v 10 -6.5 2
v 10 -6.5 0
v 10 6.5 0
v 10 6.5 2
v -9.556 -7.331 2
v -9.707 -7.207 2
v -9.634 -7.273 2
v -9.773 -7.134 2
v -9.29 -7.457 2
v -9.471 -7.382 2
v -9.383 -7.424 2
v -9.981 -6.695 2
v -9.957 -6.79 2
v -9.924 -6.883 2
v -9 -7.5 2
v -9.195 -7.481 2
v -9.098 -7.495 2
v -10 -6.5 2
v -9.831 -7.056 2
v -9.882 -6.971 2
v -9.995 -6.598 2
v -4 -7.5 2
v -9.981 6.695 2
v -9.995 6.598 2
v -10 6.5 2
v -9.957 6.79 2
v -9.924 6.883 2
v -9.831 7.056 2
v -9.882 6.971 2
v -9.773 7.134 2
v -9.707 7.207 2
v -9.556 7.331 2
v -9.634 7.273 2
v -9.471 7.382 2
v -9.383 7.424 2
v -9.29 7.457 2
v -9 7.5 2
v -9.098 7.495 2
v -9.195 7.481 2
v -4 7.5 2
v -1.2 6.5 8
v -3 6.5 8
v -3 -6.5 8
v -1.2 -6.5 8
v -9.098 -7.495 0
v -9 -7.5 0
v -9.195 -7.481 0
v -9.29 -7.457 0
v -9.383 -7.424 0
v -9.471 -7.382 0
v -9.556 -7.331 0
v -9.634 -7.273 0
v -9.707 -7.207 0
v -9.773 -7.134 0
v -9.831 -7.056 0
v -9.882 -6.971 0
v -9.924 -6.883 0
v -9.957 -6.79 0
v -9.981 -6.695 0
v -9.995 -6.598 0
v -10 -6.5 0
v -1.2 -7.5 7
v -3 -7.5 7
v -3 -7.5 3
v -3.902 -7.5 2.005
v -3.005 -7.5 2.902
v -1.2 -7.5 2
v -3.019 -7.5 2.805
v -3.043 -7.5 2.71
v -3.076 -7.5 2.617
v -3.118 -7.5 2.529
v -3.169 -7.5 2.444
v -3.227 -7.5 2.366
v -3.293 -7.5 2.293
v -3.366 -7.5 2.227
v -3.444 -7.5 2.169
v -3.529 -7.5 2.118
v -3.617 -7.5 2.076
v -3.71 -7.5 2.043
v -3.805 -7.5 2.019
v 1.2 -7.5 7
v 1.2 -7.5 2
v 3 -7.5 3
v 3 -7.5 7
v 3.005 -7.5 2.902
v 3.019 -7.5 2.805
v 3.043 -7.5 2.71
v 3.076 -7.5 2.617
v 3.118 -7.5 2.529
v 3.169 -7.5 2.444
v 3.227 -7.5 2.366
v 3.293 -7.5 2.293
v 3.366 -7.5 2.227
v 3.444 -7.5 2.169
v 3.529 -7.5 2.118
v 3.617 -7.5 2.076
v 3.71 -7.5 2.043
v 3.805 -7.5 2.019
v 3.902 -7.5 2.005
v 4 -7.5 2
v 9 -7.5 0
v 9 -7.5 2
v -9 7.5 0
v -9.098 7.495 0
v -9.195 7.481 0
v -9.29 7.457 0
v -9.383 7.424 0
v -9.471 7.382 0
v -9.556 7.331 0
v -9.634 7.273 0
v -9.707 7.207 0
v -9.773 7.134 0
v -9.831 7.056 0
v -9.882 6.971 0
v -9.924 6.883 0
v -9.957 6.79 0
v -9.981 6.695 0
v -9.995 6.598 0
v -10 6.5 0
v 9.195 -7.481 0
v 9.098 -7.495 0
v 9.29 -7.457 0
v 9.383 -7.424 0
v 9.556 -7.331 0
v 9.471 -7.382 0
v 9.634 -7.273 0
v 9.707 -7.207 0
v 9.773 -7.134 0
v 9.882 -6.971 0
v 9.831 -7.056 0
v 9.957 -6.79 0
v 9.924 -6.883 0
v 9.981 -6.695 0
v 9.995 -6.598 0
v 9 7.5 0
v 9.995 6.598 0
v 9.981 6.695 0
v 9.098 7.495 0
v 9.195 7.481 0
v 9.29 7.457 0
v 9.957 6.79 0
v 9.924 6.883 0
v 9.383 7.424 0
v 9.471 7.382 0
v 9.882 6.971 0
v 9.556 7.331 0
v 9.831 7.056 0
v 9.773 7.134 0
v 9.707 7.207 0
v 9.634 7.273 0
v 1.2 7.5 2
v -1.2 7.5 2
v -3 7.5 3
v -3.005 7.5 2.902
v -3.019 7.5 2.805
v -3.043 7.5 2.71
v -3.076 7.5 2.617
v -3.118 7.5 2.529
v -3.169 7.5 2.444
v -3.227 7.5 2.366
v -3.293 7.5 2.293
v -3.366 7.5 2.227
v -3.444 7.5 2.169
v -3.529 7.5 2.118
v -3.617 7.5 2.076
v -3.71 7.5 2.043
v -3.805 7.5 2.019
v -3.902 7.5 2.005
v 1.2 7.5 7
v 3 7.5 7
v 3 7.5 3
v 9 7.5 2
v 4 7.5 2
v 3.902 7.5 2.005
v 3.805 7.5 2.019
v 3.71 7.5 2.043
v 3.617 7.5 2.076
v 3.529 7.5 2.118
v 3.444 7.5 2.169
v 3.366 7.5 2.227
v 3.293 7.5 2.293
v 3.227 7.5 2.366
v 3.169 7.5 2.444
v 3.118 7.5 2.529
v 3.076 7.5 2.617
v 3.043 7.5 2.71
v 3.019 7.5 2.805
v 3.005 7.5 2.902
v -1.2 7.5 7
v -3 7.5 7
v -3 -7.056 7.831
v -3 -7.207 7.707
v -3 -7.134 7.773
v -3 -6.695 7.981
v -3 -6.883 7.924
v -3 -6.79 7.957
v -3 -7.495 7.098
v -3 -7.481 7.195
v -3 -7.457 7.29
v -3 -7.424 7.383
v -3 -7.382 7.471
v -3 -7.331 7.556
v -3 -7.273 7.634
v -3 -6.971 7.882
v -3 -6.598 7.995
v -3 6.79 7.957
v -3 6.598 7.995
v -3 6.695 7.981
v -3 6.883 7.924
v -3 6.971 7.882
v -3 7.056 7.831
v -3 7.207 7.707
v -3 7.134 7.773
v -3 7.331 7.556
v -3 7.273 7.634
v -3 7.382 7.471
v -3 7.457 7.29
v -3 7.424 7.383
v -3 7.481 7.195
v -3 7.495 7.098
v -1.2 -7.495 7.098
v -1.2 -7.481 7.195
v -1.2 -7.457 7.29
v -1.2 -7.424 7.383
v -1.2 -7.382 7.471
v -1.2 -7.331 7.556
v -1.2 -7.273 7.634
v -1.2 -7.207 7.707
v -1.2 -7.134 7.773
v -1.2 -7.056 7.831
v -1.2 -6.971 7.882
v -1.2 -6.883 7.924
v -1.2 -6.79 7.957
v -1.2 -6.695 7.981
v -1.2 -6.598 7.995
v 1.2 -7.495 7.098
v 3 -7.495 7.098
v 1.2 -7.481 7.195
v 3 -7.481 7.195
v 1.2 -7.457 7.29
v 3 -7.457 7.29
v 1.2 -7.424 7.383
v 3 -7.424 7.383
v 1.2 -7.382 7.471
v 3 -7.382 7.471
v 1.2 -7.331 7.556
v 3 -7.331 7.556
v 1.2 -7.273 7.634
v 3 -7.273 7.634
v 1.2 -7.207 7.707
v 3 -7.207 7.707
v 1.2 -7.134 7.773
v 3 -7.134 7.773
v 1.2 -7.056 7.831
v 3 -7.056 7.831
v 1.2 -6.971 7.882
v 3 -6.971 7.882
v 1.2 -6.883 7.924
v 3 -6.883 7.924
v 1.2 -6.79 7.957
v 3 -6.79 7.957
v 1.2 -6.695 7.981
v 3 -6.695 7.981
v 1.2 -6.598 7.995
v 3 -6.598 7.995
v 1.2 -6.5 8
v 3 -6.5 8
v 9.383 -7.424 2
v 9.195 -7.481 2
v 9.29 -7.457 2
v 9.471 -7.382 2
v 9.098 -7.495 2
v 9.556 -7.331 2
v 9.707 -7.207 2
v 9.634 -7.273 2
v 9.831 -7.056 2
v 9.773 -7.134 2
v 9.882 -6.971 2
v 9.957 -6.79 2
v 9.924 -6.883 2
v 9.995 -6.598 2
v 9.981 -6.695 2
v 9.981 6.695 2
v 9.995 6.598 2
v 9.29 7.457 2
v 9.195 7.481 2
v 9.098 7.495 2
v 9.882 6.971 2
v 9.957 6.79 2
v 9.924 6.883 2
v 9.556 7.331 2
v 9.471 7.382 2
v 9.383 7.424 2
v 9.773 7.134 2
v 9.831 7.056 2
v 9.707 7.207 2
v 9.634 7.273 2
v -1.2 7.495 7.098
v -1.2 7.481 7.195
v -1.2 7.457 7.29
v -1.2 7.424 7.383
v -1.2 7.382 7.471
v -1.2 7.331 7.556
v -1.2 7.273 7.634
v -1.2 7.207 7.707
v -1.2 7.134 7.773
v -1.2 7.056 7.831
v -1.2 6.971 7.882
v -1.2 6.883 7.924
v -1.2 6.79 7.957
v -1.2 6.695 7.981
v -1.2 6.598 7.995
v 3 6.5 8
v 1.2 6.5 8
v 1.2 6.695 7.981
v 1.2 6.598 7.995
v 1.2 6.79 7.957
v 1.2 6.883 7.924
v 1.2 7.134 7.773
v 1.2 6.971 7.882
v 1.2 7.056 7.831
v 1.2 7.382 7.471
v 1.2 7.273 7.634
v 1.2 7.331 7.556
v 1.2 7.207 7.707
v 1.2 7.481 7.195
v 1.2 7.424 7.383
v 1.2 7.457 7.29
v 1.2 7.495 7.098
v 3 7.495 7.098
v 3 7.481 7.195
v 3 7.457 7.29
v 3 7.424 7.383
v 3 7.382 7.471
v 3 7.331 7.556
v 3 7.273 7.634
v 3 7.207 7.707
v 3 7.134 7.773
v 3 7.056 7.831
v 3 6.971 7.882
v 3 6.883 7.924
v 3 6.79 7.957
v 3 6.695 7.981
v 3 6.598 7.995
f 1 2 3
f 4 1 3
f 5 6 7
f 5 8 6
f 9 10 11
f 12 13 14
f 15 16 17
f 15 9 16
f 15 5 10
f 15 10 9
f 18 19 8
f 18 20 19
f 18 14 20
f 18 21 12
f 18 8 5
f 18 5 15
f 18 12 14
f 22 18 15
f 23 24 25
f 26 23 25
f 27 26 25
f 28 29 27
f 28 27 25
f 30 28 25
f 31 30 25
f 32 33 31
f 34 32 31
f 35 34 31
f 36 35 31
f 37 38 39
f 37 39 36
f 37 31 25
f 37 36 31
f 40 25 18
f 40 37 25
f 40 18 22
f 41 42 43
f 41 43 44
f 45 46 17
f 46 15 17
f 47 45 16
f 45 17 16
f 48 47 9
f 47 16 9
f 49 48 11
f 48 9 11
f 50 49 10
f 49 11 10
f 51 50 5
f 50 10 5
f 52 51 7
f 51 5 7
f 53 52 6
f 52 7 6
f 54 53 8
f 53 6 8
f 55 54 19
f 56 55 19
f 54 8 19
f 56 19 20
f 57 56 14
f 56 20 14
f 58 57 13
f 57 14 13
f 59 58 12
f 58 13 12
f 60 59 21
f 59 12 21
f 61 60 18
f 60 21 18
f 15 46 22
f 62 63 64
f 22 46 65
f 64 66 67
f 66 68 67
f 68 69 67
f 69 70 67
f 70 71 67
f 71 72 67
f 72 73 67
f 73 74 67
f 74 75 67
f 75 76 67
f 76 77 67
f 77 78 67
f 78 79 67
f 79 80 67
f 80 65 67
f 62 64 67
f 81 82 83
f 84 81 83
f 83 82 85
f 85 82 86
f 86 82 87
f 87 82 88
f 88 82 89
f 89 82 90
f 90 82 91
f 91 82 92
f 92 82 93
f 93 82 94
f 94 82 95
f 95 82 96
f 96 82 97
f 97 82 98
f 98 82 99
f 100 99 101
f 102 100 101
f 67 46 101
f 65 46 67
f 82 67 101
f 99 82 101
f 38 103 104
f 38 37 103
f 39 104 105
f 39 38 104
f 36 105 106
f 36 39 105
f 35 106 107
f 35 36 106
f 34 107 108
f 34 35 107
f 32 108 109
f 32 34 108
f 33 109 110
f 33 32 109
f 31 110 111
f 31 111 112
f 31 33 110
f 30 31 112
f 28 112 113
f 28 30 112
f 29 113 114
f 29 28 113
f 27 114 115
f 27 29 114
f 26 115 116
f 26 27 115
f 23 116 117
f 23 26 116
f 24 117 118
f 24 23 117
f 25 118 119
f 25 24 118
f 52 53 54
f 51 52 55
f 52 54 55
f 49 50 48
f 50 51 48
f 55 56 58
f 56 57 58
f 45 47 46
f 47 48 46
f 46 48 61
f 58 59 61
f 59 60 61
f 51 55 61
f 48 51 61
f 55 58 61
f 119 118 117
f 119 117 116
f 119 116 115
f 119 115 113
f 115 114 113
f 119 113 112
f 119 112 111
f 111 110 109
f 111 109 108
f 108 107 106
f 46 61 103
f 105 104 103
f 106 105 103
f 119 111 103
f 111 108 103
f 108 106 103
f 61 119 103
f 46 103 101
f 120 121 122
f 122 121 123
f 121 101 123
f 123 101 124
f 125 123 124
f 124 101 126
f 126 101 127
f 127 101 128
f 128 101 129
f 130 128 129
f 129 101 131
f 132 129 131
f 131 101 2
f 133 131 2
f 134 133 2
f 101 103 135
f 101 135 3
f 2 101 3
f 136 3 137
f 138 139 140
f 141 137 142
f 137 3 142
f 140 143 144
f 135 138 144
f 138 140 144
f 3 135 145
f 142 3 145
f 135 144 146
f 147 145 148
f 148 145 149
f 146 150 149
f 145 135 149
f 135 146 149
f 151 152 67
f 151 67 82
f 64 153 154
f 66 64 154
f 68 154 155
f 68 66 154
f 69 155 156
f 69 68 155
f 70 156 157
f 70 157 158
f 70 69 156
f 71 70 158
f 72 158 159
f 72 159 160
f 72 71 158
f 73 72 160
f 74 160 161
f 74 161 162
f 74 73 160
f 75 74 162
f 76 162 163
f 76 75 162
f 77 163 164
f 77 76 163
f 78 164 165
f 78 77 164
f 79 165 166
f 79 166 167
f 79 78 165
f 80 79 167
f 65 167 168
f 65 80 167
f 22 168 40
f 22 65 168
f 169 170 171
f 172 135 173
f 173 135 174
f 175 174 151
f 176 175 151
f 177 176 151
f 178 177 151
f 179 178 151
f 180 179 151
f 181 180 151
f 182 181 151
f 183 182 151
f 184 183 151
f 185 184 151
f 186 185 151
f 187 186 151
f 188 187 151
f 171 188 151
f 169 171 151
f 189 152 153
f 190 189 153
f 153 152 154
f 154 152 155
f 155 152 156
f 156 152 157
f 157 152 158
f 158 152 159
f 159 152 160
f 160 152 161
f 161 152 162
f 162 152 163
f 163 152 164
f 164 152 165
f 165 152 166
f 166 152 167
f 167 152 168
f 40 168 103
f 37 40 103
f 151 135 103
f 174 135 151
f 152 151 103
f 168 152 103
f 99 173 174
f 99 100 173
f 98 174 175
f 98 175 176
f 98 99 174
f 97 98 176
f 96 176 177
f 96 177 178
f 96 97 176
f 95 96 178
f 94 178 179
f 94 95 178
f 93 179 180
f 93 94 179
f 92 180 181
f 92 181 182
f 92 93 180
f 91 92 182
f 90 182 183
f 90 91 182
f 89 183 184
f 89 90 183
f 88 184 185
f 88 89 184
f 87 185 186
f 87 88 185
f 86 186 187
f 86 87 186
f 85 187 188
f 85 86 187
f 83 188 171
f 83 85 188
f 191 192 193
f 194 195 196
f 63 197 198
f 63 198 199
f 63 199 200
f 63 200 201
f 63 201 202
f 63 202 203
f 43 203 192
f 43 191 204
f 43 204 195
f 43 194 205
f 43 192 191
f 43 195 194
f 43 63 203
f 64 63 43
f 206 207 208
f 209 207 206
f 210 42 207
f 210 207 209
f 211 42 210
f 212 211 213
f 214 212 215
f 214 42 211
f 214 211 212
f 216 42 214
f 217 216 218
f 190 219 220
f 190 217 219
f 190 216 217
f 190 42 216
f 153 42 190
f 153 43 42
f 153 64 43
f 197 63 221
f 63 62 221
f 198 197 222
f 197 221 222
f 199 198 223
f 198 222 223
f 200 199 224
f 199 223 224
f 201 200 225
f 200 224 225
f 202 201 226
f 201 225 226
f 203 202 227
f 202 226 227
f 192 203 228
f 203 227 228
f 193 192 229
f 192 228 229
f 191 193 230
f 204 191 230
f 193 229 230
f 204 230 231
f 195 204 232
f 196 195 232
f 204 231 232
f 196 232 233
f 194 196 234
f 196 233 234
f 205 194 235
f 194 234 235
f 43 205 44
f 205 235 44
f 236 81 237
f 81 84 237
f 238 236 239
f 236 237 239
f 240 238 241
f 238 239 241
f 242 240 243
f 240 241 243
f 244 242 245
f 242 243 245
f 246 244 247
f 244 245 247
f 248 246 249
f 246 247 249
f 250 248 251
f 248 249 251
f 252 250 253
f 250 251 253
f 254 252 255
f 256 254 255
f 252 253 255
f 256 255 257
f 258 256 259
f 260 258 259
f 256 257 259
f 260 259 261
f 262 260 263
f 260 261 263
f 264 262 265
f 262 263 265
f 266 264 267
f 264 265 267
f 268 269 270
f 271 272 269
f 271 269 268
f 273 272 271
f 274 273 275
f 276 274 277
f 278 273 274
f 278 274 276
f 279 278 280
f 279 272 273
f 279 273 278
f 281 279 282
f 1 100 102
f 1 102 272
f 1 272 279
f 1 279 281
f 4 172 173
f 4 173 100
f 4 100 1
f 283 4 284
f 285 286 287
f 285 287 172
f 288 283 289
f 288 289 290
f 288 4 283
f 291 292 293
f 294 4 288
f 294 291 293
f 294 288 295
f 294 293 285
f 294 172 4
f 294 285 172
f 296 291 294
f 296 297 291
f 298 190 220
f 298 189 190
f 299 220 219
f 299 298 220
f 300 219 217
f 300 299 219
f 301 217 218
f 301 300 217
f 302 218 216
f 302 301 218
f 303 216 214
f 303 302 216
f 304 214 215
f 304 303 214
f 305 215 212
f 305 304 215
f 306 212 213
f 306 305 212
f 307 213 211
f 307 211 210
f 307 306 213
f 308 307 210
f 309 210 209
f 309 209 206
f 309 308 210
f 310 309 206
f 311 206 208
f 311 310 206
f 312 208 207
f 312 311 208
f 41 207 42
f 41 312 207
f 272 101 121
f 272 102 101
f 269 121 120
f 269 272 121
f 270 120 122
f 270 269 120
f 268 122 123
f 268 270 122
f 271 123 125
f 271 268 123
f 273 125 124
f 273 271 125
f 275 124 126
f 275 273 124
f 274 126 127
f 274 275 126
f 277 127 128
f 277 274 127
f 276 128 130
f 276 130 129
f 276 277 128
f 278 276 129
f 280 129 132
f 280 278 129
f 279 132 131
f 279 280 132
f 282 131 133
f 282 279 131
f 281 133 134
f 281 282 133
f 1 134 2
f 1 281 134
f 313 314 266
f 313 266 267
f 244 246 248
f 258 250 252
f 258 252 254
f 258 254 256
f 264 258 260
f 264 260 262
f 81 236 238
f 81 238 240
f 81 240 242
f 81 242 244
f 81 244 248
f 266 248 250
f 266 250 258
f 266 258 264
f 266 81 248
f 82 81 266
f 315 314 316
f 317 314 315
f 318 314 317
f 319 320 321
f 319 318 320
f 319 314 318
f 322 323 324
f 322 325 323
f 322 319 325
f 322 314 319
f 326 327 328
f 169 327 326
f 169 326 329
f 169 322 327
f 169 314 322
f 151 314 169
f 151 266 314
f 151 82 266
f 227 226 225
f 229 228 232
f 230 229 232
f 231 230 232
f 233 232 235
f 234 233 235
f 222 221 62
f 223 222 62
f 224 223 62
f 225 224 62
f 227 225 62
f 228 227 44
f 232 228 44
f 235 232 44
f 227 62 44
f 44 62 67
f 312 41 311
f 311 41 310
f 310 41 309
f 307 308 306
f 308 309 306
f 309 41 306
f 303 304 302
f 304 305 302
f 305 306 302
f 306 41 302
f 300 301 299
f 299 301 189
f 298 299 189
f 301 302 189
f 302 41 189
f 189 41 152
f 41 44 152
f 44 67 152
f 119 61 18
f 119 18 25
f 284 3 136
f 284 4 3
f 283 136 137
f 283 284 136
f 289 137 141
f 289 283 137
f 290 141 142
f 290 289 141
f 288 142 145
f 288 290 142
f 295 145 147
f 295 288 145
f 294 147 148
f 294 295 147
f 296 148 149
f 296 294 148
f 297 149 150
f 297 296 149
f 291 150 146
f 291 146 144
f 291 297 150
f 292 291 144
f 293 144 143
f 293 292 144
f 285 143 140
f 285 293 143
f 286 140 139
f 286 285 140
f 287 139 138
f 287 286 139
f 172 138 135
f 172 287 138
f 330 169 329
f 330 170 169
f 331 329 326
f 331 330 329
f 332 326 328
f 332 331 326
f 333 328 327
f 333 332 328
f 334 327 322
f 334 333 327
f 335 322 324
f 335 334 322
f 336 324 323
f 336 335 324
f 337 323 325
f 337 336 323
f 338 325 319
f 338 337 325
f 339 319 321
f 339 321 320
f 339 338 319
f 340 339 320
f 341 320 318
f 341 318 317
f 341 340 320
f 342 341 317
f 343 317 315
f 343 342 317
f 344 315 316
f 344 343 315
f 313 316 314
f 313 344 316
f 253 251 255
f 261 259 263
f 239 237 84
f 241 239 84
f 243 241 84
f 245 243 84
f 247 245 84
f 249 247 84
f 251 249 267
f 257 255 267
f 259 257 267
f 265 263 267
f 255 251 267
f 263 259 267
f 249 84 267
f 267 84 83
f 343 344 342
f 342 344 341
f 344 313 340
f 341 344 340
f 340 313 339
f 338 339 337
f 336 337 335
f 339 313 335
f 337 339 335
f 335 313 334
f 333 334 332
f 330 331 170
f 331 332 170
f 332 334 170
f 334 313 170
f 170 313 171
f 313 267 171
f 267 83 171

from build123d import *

# Parameters (mm, degrees)
F0_W     = 7
F0_H     = 15
F0_W_2   = 1.8
F0_W_3   = 2.4
F1_DEPTH = 2
F2_DEPTH = 8
F3_R     = 1


with BuildPart() as f1:
    # F0 (on Top) → F1 (new body)
    with BuildSketch(Plane.XY):
        with Locations((-6.5, 0)):
            Rectangle(F0_W, F0_H)
        with Locations((-2.1, 0)):
            Rectangle(F0_W_2, F0_H)
        Rectangle(F0_W_3, F0_H)
        with Locations((2.1, 0)):
            Rectangle(F0_W_2, F0_H)
        with Locations((6.5, 0)):
            Rectangle(F0_W, F0_H)
    extrude(amount=F1_DEPTH)

    # F0 (on Top) → F2 (join)
    with BuildSketch(Plane.XY):
        with Locations((-2.1, 0)):
            Rectangle(F0_W_2, F0_H)
        with Locations((2.1, 0)):
            Rectangle(F0_W_2, F0_H)
    extrude(amount=F2_DEPTH)

    # F3
    f3_edges = [f1.edges().sort_by_distance(p)[0] for p in [
        (2.1, -7.5, 8),
        (-2.1, -7.5, 8),
        (-2.1, 7.5, 8),
        (2.1, 7.5, 8),
        (10, -7.5, 1),
        (10, 7.5, 1),
        (-10, -7.5, 1),
        (-10, 7.5, 1),
        (3, 0, 2),
        (-3, 0, 2),
    ]]
    fillet(f3_edges, radius=F3_R)


solid = f1.part
